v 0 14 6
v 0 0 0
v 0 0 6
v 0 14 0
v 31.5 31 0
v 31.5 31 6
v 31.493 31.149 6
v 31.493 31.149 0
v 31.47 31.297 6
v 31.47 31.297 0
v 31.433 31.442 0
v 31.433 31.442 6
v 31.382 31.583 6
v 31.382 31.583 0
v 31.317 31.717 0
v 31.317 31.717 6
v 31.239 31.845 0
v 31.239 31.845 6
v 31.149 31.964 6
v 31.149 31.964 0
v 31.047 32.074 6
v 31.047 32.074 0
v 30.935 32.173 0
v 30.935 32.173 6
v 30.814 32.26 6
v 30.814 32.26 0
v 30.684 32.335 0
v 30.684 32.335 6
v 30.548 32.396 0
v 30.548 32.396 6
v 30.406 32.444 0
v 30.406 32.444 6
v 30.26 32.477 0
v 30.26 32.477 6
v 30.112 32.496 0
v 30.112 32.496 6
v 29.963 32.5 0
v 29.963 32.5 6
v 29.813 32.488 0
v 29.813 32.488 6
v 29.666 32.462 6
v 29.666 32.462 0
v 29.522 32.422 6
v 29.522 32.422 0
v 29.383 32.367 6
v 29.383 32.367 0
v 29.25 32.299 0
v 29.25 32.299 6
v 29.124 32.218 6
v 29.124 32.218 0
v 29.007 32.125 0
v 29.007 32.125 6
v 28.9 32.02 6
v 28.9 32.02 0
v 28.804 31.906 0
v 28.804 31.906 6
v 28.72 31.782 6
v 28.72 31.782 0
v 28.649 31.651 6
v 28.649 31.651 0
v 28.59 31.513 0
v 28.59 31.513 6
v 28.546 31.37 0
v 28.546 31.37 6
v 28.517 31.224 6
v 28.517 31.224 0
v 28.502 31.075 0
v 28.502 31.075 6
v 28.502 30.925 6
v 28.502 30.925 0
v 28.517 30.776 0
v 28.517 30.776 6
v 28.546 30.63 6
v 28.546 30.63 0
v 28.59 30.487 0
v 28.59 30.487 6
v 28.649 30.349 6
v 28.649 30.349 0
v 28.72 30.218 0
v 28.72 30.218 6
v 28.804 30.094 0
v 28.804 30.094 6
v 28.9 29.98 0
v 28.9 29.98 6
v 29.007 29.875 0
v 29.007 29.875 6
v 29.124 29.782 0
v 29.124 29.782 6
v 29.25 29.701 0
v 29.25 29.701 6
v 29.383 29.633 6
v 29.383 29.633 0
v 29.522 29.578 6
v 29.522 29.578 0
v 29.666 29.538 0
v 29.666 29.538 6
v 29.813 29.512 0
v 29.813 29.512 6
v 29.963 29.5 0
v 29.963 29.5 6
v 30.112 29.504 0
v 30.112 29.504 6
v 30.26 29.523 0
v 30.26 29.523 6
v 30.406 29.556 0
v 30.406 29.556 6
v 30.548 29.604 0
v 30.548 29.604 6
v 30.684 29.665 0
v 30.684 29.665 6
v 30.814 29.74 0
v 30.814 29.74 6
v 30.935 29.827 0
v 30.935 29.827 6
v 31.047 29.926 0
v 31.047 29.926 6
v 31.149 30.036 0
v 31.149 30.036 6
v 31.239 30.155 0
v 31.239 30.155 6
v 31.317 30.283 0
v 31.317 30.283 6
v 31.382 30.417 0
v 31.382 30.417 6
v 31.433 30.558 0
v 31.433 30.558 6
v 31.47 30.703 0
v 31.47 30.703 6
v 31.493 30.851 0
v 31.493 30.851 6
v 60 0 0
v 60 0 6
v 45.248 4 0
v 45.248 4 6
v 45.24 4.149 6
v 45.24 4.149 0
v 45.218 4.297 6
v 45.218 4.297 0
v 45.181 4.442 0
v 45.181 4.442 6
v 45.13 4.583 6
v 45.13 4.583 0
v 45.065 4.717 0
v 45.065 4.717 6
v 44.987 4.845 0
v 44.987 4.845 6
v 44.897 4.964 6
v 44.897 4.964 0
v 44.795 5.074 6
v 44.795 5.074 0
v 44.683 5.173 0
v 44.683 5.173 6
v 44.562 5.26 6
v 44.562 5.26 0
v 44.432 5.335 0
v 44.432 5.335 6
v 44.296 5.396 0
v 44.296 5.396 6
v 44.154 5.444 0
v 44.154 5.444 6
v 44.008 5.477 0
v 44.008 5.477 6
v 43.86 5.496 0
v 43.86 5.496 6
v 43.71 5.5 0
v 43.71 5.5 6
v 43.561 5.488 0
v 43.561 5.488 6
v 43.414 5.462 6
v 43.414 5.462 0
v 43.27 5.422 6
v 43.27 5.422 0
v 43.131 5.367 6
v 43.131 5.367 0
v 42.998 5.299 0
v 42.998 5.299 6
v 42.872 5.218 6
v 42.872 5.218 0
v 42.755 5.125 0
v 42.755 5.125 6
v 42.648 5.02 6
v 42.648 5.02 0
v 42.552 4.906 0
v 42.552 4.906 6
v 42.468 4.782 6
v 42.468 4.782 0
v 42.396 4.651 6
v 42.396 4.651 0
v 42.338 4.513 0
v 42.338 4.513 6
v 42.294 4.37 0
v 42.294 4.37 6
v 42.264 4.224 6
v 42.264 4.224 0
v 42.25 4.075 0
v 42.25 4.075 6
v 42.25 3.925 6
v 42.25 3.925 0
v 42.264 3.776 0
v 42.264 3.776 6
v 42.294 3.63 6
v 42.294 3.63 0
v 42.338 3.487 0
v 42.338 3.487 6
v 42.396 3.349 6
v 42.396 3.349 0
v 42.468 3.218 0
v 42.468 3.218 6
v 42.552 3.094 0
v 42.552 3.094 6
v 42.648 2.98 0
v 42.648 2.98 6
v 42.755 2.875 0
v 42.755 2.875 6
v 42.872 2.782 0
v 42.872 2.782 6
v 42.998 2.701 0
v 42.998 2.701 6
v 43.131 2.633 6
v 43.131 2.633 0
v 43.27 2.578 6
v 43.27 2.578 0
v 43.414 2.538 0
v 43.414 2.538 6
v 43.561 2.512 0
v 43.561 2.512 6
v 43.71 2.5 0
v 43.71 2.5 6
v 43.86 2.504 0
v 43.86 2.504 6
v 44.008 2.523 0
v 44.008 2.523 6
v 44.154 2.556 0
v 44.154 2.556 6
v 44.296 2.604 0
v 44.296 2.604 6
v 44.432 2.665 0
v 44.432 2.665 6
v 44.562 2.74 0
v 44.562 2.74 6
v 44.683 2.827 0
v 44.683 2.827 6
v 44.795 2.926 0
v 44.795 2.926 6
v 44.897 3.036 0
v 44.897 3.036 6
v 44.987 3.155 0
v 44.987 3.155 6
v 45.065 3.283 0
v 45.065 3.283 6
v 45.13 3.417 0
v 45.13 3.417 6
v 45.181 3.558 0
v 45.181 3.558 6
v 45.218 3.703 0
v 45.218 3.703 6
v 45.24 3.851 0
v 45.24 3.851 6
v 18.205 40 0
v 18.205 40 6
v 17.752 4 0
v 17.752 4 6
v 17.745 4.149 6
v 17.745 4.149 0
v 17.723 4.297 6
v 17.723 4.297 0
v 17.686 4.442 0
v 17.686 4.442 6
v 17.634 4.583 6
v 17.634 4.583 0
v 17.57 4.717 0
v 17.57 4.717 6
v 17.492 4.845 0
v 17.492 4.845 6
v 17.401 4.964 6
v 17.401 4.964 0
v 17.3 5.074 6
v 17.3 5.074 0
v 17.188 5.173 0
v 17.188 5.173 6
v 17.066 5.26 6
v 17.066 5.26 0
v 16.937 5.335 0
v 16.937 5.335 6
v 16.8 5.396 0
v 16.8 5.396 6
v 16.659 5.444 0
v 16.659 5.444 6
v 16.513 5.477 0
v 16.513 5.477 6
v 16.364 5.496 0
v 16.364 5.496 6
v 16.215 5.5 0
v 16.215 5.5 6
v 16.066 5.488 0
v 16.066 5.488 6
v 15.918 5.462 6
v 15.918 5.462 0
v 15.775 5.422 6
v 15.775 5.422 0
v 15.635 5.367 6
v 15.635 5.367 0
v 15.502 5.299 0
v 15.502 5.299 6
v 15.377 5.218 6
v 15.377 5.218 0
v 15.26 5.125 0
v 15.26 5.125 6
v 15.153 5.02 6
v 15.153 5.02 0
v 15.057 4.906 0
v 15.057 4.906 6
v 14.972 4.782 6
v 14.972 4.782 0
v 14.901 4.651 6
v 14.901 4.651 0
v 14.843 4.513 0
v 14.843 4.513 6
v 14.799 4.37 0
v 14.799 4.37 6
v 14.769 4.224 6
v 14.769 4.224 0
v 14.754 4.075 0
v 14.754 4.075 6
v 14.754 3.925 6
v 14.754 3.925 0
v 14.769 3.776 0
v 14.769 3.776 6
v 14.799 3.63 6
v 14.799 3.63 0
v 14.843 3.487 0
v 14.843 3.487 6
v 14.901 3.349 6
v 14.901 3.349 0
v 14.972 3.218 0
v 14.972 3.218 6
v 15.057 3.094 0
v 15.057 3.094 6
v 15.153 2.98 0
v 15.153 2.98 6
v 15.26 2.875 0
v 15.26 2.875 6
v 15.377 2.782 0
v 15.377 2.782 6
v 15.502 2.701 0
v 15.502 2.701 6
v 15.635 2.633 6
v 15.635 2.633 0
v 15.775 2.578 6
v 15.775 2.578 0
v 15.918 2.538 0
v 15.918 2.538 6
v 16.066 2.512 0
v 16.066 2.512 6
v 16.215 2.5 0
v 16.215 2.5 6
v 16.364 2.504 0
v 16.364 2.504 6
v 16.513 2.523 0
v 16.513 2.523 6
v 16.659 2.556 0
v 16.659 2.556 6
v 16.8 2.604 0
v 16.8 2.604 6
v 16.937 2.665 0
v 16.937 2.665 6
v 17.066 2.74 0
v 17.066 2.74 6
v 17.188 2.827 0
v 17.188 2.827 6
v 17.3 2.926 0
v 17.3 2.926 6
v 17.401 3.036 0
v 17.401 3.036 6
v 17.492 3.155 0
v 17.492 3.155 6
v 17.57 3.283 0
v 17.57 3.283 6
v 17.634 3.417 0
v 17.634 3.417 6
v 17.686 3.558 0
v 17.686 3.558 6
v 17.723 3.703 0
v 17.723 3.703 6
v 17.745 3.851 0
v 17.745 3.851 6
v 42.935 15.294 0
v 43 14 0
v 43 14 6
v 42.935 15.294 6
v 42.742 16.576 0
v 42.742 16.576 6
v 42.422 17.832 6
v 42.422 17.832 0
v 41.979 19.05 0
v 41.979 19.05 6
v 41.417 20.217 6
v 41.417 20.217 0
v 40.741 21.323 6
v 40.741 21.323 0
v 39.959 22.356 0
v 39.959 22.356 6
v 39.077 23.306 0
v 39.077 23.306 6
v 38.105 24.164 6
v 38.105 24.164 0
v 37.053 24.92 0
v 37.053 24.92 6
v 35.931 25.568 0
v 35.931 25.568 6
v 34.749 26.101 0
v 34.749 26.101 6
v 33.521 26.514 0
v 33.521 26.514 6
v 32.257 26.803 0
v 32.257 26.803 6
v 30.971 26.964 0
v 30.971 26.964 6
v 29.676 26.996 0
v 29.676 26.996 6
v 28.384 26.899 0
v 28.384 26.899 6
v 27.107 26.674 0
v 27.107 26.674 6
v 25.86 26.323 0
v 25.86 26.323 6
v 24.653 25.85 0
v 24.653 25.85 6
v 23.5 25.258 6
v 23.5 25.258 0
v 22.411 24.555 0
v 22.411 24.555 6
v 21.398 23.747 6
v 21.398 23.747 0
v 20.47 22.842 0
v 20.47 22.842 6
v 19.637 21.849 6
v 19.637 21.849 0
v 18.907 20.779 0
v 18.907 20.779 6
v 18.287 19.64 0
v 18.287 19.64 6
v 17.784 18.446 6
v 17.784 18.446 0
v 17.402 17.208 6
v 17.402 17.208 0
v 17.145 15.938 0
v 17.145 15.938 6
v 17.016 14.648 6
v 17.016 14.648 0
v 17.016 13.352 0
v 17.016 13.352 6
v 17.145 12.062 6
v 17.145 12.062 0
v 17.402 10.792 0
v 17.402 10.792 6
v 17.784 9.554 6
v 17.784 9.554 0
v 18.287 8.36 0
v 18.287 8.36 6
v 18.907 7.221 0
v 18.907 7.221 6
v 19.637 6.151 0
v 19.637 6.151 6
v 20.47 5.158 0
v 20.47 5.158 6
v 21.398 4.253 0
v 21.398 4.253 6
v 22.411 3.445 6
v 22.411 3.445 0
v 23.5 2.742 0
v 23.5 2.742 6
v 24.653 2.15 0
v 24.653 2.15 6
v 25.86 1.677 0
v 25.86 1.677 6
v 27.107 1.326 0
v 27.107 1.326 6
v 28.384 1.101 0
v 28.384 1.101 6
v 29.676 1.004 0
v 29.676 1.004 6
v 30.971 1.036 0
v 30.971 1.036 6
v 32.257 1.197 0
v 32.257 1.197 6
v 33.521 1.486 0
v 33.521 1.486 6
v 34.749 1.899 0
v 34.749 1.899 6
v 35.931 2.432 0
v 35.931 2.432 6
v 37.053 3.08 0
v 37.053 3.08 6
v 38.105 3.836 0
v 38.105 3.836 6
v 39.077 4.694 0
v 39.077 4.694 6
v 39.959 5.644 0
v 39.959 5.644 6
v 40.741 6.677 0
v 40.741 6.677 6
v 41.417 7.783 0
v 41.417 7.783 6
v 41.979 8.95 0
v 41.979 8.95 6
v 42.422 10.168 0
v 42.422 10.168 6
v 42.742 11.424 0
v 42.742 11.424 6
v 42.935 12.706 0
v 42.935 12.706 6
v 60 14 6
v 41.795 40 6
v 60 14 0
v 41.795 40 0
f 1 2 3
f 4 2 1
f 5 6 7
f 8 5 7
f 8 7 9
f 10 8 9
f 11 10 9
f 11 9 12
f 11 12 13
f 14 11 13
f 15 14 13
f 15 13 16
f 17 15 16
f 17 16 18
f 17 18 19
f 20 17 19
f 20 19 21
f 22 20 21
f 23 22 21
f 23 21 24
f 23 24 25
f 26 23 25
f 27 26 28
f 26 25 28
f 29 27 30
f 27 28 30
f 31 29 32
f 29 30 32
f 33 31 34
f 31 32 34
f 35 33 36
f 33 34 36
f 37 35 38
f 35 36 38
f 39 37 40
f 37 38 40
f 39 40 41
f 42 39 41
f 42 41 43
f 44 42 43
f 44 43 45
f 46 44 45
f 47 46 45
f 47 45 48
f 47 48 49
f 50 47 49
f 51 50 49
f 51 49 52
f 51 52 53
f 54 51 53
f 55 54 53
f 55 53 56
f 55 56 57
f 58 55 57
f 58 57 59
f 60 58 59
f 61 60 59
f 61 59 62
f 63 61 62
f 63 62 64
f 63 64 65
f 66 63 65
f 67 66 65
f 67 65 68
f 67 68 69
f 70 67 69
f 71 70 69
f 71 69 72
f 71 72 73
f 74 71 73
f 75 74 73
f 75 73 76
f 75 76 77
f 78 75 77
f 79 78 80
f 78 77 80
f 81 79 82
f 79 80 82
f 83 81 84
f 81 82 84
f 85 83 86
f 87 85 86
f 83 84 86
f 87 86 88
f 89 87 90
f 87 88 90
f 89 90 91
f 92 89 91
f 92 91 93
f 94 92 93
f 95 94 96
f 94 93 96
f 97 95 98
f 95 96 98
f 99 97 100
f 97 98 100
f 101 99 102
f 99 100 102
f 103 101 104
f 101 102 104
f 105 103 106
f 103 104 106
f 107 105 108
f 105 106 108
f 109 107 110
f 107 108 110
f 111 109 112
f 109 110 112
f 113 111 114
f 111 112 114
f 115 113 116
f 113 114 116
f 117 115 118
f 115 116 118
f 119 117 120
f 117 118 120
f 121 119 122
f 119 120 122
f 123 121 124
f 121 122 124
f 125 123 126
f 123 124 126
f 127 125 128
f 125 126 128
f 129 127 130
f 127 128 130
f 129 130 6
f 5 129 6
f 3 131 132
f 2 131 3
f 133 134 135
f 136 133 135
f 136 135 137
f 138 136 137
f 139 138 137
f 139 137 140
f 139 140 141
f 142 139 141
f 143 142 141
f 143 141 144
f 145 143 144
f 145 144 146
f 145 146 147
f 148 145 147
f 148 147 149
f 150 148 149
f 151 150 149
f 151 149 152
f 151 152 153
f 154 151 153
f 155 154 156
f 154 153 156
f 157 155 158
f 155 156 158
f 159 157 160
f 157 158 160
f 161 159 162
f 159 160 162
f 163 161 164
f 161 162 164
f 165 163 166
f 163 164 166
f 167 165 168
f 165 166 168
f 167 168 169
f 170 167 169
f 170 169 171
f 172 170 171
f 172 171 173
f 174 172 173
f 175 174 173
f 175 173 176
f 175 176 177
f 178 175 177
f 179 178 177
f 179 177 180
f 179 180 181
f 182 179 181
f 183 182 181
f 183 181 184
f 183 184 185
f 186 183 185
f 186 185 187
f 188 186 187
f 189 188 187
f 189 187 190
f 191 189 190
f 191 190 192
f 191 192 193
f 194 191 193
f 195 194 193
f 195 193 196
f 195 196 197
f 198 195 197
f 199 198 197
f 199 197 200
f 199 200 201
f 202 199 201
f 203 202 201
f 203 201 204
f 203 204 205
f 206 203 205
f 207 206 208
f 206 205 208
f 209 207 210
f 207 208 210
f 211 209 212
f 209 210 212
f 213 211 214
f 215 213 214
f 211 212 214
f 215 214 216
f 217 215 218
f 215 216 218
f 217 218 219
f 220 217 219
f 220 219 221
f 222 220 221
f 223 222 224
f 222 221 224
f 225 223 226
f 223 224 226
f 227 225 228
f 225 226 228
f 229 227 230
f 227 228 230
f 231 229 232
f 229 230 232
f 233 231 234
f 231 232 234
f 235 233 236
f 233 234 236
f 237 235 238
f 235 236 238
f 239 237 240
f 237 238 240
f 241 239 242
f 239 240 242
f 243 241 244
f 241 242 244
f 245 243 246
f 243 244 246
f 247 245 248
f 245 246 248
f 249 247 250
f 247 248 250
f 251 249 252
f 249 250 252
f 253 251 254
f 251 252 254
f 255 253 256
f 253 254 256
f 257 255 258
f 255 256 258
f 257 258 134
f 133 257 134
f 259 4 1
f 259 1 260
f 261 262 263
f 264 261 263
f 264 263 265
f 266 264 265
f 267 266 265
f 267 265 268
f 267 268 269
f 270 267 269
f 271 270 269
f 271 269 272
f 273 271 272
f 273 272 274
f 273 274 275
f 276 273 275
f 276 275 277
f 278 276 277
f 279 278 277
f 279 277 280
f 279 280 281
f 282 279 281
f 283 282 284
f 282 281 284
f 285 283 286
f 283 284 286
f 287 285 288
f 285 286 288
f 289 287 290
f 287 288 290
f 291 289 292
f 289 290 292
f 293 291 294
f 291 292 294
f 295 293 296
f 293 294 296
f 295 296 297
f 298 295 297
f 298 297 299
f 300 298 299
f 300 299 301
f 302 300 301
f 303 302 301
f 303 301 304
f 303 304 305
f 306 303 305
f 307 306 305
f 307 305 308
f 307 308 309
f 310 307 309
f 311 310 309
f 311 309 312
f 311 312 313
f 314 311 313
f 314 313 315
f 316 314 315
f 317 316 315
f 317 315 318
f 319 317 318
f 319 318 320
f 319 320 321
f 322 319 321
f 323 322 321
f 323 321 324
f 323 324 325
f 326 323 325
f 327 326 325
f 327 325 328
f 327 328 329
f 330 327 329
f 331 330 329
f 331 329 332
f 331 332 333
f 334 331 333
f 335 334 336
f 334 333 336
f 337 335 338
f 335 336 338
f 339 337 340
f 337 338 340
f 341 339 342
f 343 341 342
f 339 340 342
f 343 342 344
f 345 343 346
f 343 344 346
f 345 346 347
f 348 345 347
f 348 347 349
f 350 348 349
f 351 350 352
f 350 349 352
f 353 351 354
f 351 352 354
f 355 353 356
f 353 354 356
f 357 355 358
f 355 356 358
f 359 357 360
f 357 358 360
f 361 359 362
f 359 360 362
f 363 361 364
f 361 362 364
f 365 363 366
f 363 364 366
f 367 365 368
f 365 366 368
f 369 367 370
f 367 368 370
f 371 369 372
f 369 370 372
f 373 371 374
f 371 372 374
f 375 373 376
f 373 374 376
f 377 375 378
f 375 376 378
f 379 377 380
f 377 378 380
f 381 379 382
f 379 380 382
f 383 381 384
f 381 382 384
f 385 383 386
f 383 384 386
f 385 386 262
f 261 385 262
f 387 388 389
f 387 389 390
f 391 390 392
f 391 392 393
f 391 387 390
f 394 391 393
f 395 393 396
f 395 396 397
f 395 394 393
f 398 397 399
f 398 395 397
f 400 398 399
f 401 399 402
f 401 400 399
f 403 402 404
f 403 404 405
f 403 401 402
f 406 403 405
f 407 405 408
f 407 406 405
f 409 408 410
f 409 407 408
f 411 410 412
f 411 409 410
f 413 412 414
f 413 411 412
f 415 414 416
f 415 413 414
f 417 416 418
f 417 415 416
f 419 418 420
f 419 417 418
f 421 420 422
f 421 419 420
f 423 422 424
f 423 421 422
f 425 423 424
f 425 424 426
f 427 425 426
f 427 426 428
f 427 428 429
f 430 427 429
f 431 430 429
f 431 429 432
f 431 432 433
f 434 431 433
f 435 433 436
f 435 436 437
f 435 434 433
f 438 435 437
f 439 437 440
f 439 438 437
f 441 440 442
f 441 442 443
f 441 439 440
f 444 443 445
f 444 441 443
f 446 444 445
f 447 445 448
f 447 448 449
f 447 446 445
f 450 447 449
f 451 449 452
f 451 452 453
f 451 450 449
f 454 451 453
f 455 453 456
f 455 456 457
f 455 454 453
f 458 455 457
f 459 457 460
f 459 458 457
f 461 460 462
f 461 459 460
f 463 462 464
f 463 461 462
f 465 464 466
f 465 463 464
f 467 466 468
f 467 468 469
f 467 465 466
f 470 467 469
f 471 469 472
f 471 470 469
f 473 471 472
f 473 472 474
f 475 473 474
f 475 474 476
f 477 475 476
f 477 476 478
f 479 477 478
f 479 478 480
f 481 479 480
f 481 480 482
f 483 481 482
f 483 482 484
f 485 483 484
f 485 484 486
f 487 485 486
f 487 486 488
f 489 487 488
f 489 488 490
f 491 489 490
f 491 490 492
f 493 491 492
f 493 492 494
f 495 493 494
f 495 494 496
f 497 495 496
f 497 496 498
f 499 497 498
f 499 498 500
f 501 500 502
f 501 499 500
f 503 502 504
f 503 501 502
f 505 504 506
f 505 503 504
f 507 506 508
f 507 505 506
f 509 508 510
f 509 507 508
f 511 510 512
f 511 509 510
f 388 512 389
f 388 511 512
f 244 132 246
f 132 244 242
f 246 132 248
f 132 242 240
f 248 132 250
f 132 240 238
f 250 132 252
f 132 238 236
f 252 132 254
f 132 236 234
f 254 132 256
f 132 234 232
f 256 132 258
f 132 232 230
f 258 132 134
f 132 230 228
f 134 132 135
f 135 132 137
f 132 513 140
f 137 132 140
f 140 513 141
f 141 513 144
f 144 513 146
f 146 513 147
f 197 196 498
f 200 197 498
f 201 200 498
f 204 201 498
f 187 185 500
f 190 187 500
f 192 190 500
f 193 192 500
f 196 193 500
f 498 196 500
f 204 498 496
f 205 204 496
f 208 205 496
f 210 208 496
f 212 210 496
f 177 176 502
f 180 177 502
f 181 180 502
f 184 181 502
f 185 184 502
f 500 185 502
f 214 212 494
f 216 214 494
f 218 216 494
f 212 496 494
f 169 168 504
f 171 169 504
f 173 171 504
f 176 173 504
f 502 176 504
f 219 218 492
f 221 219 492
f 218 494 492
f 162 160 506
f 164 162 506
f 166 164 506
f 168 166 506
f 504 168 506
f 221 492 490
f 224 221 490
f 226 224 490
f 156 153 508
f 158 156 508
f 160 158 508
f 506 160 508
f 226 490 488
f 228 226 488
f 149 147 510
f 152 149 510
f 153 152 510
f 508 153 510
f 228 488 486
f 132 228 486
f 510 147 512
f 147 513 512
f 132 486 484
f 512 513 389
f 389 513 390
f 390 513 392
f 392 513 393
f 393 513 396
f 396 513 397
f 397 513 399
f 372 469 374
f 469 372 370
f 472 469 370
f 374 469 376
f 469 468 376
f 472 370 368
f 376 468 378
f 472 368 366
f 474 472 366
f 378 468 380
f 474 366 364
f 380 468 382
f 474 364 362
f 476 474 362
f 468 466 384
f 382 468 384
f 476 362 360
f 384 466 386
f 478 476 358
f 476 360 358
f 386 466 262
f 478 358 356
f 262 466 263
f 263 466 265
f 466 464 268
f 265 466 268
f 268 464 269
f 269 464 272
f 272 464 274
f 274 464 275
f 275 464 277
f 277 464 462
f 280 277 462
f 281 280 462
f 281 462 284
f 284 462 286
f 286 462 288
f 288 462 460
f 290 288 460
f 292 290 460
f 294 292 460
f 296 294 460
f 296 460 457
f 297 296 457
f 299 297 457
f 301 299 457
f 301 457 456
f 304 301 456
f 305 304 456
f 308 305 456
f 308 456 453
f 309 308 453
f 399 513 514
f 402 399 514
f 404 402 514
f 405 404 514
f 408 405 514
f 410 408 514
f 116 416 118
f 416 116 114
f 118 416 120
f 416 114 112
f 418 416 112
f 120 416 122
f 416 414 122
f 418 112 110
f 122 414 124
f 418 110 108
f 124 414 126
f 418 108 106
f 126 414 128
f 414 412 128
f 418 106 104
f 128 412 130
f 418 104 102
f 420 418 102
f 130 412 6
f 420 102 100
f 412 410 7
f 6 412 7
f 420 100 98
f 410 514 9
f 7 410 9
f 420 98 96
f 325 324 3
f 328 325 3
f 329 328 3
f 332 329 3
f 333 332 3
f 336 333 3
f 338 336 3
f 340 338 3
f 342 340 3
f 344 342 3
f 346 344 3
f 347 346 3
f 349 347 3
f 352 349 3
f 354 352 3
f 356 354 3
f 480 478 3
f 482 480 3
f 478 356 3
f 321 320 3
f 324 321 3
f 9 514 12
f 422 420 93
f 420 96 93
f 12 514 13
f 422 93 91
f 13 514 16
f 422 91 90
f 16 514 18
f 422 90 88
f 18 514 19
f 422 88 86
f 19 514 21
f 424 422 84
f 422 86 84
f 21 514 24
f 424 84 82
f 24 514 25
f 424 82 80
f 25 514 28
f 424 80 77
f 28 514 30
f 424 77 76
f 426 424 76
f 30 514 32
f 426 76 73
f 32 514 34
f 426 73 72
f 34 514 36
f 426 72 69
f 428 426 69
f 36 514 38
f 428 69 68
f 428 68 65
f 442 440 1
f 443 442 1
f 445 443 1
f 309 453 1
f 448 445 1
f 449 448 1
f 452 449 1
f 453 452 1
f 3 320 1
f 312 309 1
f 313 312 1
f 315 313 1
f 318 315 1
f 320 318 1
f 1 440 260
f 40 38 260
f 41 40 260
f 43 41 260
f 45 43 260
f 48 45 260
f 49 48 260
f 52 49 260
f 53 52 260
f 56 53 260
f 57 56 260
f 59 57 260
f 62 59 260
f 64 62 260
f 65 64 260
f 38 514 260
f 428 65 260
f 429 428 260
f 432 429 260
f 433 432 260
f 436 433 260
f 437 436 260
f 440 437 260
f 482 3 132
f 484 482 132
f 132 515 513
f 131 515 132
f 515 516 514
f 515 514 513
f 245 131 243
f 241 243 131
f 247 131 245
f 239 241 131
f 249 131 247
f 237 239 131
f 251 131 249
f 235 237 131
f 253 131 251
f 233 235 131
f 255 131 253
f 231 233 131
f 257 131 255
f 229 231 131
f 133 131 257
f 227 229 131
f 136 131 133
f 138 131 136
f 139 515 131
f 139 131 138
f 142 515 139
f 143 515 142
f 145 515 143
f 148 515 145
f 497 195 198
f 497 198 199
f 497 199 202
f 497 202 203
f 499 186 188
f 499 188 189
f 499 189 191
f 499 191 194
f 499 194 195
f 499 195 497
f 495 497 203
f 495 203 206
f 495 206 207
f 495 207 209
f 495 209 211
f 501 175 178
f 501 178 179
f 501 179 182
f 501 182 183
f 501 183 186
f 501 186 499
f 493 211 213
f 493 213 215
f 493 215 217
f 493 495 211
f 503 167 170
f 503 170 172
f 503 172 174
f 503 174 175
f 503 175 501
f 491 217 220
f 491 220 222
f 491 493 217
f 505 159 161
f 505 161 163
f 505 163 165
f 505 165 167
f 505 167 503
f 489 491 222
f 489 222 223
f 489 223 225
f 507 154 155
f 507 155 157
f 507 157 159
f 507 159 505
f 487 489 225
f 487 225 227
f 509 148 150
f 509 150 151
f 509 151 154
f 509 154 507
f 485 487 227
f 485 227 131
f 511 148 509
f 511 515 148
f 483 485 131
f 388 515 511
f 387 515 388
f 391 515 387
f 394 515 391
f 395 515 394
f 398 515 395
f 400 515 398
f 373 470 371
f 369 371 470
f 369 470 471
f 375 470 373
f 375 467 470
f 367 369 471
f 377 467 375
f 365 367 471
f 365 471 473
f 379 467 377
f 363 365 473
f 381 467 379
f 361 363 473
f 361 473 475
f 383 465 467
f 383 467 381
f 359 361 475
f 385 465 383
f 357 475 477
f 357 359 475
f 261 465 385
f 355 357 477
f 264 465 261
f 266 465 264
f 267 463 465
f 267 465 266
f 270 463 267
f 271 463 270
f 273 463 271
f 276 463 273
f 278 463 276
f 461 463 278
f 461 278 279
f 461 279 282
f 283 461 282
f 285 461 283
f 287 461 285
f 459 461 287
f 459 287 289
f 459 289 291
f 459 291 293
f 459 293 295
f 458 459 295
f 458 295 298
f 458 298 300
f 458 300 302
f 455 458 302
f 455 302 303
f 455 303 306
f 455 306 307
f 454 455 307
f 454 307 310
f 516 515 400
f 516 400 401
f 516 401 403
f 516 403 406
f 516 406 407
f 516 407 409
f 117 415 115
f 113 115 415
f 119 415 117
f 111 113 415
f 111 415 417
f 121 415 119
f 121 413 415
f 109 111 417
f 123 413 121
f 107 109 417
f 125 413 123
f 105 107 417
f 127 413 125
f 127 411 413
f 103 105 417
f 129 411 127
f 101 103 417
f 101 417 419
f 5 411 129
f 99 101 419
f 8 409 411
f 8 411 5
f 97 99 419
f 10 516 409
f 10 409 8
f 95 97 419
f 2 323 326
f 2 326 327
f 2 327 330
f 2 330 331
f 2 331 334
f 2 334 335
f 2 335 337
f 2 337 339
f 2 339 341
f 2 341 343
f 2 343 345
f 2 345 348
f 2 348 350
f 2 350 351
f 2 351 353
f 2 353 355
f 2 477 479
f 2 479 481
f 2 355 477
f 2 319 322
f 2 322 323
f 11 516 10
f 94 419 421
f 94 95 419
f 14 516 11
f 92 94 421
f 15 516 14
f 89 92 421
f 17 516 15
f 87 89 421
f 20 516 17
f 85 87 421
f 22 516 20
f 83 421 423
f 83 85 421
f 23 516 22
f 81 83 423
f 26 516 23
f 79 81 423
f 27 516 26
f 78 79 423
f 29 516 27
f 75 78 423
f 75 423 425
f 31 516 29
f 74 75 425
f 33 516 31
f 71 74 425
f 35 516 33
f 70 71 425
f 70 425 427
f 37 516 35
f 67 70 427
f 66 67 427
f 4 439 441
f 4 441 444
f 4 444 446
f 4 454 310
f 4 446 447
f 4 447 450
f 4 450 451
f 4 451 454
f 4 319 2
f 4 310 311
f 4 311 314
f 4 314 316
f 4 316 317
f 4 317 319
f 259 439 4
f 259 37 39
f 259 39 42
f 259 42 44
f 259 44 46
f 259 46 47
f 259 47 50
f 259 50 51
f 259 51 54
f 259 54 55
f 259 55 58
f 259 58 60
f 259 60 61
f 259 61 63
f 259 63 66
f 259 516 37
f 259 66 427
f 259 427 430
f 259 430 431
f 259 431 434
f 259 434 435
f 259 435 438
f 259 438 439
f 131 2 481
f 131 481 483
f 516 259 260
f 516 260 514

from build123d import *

# Parameters (mm, degrees)
ESQUISSE1_R             = 13
BOSS_EXTRU_1_DEPTH      = 6
ESQUISSE2_R             = 1.5
ENL_V_MAT_EXTRU_1_DEPTH = 10


with BuildPart() as part:
    # Esquisse1 → Boss.-Extru.1 (new body)
    with BuildSketch(Plane.XY):
        Polygon((41.794604007, 40), (60, 14), (60, 0), (0, 0), (0, 14), (18.205395993, 40), align=None)
        with Locations((30, 14)):
            Circle(ESQUISSE1_R, mode=Mode.SUBTRACT)
    extrude(amount=BOSS_EXTRU_1_DEPTH)

    # Esquisse2 → Enlèv. mat.-Extru.1 (cut)
    with BuildSketch(Plane.XY.offset(6)):
        with Locations((16.252272915, 4)):
            Circle(ESQUISSE2_R)
        with Locations((43.747727085, 4)):
            Circle(ESQUISSE2_R)
        with Locations((30, 31)):
            Circle(ESQUISSE2_R)
    extrude(amount=-ENL_V_MAT_EXTRU_1_DEPTH, mode=Mode.SUBTRACT)


solid = part.part
